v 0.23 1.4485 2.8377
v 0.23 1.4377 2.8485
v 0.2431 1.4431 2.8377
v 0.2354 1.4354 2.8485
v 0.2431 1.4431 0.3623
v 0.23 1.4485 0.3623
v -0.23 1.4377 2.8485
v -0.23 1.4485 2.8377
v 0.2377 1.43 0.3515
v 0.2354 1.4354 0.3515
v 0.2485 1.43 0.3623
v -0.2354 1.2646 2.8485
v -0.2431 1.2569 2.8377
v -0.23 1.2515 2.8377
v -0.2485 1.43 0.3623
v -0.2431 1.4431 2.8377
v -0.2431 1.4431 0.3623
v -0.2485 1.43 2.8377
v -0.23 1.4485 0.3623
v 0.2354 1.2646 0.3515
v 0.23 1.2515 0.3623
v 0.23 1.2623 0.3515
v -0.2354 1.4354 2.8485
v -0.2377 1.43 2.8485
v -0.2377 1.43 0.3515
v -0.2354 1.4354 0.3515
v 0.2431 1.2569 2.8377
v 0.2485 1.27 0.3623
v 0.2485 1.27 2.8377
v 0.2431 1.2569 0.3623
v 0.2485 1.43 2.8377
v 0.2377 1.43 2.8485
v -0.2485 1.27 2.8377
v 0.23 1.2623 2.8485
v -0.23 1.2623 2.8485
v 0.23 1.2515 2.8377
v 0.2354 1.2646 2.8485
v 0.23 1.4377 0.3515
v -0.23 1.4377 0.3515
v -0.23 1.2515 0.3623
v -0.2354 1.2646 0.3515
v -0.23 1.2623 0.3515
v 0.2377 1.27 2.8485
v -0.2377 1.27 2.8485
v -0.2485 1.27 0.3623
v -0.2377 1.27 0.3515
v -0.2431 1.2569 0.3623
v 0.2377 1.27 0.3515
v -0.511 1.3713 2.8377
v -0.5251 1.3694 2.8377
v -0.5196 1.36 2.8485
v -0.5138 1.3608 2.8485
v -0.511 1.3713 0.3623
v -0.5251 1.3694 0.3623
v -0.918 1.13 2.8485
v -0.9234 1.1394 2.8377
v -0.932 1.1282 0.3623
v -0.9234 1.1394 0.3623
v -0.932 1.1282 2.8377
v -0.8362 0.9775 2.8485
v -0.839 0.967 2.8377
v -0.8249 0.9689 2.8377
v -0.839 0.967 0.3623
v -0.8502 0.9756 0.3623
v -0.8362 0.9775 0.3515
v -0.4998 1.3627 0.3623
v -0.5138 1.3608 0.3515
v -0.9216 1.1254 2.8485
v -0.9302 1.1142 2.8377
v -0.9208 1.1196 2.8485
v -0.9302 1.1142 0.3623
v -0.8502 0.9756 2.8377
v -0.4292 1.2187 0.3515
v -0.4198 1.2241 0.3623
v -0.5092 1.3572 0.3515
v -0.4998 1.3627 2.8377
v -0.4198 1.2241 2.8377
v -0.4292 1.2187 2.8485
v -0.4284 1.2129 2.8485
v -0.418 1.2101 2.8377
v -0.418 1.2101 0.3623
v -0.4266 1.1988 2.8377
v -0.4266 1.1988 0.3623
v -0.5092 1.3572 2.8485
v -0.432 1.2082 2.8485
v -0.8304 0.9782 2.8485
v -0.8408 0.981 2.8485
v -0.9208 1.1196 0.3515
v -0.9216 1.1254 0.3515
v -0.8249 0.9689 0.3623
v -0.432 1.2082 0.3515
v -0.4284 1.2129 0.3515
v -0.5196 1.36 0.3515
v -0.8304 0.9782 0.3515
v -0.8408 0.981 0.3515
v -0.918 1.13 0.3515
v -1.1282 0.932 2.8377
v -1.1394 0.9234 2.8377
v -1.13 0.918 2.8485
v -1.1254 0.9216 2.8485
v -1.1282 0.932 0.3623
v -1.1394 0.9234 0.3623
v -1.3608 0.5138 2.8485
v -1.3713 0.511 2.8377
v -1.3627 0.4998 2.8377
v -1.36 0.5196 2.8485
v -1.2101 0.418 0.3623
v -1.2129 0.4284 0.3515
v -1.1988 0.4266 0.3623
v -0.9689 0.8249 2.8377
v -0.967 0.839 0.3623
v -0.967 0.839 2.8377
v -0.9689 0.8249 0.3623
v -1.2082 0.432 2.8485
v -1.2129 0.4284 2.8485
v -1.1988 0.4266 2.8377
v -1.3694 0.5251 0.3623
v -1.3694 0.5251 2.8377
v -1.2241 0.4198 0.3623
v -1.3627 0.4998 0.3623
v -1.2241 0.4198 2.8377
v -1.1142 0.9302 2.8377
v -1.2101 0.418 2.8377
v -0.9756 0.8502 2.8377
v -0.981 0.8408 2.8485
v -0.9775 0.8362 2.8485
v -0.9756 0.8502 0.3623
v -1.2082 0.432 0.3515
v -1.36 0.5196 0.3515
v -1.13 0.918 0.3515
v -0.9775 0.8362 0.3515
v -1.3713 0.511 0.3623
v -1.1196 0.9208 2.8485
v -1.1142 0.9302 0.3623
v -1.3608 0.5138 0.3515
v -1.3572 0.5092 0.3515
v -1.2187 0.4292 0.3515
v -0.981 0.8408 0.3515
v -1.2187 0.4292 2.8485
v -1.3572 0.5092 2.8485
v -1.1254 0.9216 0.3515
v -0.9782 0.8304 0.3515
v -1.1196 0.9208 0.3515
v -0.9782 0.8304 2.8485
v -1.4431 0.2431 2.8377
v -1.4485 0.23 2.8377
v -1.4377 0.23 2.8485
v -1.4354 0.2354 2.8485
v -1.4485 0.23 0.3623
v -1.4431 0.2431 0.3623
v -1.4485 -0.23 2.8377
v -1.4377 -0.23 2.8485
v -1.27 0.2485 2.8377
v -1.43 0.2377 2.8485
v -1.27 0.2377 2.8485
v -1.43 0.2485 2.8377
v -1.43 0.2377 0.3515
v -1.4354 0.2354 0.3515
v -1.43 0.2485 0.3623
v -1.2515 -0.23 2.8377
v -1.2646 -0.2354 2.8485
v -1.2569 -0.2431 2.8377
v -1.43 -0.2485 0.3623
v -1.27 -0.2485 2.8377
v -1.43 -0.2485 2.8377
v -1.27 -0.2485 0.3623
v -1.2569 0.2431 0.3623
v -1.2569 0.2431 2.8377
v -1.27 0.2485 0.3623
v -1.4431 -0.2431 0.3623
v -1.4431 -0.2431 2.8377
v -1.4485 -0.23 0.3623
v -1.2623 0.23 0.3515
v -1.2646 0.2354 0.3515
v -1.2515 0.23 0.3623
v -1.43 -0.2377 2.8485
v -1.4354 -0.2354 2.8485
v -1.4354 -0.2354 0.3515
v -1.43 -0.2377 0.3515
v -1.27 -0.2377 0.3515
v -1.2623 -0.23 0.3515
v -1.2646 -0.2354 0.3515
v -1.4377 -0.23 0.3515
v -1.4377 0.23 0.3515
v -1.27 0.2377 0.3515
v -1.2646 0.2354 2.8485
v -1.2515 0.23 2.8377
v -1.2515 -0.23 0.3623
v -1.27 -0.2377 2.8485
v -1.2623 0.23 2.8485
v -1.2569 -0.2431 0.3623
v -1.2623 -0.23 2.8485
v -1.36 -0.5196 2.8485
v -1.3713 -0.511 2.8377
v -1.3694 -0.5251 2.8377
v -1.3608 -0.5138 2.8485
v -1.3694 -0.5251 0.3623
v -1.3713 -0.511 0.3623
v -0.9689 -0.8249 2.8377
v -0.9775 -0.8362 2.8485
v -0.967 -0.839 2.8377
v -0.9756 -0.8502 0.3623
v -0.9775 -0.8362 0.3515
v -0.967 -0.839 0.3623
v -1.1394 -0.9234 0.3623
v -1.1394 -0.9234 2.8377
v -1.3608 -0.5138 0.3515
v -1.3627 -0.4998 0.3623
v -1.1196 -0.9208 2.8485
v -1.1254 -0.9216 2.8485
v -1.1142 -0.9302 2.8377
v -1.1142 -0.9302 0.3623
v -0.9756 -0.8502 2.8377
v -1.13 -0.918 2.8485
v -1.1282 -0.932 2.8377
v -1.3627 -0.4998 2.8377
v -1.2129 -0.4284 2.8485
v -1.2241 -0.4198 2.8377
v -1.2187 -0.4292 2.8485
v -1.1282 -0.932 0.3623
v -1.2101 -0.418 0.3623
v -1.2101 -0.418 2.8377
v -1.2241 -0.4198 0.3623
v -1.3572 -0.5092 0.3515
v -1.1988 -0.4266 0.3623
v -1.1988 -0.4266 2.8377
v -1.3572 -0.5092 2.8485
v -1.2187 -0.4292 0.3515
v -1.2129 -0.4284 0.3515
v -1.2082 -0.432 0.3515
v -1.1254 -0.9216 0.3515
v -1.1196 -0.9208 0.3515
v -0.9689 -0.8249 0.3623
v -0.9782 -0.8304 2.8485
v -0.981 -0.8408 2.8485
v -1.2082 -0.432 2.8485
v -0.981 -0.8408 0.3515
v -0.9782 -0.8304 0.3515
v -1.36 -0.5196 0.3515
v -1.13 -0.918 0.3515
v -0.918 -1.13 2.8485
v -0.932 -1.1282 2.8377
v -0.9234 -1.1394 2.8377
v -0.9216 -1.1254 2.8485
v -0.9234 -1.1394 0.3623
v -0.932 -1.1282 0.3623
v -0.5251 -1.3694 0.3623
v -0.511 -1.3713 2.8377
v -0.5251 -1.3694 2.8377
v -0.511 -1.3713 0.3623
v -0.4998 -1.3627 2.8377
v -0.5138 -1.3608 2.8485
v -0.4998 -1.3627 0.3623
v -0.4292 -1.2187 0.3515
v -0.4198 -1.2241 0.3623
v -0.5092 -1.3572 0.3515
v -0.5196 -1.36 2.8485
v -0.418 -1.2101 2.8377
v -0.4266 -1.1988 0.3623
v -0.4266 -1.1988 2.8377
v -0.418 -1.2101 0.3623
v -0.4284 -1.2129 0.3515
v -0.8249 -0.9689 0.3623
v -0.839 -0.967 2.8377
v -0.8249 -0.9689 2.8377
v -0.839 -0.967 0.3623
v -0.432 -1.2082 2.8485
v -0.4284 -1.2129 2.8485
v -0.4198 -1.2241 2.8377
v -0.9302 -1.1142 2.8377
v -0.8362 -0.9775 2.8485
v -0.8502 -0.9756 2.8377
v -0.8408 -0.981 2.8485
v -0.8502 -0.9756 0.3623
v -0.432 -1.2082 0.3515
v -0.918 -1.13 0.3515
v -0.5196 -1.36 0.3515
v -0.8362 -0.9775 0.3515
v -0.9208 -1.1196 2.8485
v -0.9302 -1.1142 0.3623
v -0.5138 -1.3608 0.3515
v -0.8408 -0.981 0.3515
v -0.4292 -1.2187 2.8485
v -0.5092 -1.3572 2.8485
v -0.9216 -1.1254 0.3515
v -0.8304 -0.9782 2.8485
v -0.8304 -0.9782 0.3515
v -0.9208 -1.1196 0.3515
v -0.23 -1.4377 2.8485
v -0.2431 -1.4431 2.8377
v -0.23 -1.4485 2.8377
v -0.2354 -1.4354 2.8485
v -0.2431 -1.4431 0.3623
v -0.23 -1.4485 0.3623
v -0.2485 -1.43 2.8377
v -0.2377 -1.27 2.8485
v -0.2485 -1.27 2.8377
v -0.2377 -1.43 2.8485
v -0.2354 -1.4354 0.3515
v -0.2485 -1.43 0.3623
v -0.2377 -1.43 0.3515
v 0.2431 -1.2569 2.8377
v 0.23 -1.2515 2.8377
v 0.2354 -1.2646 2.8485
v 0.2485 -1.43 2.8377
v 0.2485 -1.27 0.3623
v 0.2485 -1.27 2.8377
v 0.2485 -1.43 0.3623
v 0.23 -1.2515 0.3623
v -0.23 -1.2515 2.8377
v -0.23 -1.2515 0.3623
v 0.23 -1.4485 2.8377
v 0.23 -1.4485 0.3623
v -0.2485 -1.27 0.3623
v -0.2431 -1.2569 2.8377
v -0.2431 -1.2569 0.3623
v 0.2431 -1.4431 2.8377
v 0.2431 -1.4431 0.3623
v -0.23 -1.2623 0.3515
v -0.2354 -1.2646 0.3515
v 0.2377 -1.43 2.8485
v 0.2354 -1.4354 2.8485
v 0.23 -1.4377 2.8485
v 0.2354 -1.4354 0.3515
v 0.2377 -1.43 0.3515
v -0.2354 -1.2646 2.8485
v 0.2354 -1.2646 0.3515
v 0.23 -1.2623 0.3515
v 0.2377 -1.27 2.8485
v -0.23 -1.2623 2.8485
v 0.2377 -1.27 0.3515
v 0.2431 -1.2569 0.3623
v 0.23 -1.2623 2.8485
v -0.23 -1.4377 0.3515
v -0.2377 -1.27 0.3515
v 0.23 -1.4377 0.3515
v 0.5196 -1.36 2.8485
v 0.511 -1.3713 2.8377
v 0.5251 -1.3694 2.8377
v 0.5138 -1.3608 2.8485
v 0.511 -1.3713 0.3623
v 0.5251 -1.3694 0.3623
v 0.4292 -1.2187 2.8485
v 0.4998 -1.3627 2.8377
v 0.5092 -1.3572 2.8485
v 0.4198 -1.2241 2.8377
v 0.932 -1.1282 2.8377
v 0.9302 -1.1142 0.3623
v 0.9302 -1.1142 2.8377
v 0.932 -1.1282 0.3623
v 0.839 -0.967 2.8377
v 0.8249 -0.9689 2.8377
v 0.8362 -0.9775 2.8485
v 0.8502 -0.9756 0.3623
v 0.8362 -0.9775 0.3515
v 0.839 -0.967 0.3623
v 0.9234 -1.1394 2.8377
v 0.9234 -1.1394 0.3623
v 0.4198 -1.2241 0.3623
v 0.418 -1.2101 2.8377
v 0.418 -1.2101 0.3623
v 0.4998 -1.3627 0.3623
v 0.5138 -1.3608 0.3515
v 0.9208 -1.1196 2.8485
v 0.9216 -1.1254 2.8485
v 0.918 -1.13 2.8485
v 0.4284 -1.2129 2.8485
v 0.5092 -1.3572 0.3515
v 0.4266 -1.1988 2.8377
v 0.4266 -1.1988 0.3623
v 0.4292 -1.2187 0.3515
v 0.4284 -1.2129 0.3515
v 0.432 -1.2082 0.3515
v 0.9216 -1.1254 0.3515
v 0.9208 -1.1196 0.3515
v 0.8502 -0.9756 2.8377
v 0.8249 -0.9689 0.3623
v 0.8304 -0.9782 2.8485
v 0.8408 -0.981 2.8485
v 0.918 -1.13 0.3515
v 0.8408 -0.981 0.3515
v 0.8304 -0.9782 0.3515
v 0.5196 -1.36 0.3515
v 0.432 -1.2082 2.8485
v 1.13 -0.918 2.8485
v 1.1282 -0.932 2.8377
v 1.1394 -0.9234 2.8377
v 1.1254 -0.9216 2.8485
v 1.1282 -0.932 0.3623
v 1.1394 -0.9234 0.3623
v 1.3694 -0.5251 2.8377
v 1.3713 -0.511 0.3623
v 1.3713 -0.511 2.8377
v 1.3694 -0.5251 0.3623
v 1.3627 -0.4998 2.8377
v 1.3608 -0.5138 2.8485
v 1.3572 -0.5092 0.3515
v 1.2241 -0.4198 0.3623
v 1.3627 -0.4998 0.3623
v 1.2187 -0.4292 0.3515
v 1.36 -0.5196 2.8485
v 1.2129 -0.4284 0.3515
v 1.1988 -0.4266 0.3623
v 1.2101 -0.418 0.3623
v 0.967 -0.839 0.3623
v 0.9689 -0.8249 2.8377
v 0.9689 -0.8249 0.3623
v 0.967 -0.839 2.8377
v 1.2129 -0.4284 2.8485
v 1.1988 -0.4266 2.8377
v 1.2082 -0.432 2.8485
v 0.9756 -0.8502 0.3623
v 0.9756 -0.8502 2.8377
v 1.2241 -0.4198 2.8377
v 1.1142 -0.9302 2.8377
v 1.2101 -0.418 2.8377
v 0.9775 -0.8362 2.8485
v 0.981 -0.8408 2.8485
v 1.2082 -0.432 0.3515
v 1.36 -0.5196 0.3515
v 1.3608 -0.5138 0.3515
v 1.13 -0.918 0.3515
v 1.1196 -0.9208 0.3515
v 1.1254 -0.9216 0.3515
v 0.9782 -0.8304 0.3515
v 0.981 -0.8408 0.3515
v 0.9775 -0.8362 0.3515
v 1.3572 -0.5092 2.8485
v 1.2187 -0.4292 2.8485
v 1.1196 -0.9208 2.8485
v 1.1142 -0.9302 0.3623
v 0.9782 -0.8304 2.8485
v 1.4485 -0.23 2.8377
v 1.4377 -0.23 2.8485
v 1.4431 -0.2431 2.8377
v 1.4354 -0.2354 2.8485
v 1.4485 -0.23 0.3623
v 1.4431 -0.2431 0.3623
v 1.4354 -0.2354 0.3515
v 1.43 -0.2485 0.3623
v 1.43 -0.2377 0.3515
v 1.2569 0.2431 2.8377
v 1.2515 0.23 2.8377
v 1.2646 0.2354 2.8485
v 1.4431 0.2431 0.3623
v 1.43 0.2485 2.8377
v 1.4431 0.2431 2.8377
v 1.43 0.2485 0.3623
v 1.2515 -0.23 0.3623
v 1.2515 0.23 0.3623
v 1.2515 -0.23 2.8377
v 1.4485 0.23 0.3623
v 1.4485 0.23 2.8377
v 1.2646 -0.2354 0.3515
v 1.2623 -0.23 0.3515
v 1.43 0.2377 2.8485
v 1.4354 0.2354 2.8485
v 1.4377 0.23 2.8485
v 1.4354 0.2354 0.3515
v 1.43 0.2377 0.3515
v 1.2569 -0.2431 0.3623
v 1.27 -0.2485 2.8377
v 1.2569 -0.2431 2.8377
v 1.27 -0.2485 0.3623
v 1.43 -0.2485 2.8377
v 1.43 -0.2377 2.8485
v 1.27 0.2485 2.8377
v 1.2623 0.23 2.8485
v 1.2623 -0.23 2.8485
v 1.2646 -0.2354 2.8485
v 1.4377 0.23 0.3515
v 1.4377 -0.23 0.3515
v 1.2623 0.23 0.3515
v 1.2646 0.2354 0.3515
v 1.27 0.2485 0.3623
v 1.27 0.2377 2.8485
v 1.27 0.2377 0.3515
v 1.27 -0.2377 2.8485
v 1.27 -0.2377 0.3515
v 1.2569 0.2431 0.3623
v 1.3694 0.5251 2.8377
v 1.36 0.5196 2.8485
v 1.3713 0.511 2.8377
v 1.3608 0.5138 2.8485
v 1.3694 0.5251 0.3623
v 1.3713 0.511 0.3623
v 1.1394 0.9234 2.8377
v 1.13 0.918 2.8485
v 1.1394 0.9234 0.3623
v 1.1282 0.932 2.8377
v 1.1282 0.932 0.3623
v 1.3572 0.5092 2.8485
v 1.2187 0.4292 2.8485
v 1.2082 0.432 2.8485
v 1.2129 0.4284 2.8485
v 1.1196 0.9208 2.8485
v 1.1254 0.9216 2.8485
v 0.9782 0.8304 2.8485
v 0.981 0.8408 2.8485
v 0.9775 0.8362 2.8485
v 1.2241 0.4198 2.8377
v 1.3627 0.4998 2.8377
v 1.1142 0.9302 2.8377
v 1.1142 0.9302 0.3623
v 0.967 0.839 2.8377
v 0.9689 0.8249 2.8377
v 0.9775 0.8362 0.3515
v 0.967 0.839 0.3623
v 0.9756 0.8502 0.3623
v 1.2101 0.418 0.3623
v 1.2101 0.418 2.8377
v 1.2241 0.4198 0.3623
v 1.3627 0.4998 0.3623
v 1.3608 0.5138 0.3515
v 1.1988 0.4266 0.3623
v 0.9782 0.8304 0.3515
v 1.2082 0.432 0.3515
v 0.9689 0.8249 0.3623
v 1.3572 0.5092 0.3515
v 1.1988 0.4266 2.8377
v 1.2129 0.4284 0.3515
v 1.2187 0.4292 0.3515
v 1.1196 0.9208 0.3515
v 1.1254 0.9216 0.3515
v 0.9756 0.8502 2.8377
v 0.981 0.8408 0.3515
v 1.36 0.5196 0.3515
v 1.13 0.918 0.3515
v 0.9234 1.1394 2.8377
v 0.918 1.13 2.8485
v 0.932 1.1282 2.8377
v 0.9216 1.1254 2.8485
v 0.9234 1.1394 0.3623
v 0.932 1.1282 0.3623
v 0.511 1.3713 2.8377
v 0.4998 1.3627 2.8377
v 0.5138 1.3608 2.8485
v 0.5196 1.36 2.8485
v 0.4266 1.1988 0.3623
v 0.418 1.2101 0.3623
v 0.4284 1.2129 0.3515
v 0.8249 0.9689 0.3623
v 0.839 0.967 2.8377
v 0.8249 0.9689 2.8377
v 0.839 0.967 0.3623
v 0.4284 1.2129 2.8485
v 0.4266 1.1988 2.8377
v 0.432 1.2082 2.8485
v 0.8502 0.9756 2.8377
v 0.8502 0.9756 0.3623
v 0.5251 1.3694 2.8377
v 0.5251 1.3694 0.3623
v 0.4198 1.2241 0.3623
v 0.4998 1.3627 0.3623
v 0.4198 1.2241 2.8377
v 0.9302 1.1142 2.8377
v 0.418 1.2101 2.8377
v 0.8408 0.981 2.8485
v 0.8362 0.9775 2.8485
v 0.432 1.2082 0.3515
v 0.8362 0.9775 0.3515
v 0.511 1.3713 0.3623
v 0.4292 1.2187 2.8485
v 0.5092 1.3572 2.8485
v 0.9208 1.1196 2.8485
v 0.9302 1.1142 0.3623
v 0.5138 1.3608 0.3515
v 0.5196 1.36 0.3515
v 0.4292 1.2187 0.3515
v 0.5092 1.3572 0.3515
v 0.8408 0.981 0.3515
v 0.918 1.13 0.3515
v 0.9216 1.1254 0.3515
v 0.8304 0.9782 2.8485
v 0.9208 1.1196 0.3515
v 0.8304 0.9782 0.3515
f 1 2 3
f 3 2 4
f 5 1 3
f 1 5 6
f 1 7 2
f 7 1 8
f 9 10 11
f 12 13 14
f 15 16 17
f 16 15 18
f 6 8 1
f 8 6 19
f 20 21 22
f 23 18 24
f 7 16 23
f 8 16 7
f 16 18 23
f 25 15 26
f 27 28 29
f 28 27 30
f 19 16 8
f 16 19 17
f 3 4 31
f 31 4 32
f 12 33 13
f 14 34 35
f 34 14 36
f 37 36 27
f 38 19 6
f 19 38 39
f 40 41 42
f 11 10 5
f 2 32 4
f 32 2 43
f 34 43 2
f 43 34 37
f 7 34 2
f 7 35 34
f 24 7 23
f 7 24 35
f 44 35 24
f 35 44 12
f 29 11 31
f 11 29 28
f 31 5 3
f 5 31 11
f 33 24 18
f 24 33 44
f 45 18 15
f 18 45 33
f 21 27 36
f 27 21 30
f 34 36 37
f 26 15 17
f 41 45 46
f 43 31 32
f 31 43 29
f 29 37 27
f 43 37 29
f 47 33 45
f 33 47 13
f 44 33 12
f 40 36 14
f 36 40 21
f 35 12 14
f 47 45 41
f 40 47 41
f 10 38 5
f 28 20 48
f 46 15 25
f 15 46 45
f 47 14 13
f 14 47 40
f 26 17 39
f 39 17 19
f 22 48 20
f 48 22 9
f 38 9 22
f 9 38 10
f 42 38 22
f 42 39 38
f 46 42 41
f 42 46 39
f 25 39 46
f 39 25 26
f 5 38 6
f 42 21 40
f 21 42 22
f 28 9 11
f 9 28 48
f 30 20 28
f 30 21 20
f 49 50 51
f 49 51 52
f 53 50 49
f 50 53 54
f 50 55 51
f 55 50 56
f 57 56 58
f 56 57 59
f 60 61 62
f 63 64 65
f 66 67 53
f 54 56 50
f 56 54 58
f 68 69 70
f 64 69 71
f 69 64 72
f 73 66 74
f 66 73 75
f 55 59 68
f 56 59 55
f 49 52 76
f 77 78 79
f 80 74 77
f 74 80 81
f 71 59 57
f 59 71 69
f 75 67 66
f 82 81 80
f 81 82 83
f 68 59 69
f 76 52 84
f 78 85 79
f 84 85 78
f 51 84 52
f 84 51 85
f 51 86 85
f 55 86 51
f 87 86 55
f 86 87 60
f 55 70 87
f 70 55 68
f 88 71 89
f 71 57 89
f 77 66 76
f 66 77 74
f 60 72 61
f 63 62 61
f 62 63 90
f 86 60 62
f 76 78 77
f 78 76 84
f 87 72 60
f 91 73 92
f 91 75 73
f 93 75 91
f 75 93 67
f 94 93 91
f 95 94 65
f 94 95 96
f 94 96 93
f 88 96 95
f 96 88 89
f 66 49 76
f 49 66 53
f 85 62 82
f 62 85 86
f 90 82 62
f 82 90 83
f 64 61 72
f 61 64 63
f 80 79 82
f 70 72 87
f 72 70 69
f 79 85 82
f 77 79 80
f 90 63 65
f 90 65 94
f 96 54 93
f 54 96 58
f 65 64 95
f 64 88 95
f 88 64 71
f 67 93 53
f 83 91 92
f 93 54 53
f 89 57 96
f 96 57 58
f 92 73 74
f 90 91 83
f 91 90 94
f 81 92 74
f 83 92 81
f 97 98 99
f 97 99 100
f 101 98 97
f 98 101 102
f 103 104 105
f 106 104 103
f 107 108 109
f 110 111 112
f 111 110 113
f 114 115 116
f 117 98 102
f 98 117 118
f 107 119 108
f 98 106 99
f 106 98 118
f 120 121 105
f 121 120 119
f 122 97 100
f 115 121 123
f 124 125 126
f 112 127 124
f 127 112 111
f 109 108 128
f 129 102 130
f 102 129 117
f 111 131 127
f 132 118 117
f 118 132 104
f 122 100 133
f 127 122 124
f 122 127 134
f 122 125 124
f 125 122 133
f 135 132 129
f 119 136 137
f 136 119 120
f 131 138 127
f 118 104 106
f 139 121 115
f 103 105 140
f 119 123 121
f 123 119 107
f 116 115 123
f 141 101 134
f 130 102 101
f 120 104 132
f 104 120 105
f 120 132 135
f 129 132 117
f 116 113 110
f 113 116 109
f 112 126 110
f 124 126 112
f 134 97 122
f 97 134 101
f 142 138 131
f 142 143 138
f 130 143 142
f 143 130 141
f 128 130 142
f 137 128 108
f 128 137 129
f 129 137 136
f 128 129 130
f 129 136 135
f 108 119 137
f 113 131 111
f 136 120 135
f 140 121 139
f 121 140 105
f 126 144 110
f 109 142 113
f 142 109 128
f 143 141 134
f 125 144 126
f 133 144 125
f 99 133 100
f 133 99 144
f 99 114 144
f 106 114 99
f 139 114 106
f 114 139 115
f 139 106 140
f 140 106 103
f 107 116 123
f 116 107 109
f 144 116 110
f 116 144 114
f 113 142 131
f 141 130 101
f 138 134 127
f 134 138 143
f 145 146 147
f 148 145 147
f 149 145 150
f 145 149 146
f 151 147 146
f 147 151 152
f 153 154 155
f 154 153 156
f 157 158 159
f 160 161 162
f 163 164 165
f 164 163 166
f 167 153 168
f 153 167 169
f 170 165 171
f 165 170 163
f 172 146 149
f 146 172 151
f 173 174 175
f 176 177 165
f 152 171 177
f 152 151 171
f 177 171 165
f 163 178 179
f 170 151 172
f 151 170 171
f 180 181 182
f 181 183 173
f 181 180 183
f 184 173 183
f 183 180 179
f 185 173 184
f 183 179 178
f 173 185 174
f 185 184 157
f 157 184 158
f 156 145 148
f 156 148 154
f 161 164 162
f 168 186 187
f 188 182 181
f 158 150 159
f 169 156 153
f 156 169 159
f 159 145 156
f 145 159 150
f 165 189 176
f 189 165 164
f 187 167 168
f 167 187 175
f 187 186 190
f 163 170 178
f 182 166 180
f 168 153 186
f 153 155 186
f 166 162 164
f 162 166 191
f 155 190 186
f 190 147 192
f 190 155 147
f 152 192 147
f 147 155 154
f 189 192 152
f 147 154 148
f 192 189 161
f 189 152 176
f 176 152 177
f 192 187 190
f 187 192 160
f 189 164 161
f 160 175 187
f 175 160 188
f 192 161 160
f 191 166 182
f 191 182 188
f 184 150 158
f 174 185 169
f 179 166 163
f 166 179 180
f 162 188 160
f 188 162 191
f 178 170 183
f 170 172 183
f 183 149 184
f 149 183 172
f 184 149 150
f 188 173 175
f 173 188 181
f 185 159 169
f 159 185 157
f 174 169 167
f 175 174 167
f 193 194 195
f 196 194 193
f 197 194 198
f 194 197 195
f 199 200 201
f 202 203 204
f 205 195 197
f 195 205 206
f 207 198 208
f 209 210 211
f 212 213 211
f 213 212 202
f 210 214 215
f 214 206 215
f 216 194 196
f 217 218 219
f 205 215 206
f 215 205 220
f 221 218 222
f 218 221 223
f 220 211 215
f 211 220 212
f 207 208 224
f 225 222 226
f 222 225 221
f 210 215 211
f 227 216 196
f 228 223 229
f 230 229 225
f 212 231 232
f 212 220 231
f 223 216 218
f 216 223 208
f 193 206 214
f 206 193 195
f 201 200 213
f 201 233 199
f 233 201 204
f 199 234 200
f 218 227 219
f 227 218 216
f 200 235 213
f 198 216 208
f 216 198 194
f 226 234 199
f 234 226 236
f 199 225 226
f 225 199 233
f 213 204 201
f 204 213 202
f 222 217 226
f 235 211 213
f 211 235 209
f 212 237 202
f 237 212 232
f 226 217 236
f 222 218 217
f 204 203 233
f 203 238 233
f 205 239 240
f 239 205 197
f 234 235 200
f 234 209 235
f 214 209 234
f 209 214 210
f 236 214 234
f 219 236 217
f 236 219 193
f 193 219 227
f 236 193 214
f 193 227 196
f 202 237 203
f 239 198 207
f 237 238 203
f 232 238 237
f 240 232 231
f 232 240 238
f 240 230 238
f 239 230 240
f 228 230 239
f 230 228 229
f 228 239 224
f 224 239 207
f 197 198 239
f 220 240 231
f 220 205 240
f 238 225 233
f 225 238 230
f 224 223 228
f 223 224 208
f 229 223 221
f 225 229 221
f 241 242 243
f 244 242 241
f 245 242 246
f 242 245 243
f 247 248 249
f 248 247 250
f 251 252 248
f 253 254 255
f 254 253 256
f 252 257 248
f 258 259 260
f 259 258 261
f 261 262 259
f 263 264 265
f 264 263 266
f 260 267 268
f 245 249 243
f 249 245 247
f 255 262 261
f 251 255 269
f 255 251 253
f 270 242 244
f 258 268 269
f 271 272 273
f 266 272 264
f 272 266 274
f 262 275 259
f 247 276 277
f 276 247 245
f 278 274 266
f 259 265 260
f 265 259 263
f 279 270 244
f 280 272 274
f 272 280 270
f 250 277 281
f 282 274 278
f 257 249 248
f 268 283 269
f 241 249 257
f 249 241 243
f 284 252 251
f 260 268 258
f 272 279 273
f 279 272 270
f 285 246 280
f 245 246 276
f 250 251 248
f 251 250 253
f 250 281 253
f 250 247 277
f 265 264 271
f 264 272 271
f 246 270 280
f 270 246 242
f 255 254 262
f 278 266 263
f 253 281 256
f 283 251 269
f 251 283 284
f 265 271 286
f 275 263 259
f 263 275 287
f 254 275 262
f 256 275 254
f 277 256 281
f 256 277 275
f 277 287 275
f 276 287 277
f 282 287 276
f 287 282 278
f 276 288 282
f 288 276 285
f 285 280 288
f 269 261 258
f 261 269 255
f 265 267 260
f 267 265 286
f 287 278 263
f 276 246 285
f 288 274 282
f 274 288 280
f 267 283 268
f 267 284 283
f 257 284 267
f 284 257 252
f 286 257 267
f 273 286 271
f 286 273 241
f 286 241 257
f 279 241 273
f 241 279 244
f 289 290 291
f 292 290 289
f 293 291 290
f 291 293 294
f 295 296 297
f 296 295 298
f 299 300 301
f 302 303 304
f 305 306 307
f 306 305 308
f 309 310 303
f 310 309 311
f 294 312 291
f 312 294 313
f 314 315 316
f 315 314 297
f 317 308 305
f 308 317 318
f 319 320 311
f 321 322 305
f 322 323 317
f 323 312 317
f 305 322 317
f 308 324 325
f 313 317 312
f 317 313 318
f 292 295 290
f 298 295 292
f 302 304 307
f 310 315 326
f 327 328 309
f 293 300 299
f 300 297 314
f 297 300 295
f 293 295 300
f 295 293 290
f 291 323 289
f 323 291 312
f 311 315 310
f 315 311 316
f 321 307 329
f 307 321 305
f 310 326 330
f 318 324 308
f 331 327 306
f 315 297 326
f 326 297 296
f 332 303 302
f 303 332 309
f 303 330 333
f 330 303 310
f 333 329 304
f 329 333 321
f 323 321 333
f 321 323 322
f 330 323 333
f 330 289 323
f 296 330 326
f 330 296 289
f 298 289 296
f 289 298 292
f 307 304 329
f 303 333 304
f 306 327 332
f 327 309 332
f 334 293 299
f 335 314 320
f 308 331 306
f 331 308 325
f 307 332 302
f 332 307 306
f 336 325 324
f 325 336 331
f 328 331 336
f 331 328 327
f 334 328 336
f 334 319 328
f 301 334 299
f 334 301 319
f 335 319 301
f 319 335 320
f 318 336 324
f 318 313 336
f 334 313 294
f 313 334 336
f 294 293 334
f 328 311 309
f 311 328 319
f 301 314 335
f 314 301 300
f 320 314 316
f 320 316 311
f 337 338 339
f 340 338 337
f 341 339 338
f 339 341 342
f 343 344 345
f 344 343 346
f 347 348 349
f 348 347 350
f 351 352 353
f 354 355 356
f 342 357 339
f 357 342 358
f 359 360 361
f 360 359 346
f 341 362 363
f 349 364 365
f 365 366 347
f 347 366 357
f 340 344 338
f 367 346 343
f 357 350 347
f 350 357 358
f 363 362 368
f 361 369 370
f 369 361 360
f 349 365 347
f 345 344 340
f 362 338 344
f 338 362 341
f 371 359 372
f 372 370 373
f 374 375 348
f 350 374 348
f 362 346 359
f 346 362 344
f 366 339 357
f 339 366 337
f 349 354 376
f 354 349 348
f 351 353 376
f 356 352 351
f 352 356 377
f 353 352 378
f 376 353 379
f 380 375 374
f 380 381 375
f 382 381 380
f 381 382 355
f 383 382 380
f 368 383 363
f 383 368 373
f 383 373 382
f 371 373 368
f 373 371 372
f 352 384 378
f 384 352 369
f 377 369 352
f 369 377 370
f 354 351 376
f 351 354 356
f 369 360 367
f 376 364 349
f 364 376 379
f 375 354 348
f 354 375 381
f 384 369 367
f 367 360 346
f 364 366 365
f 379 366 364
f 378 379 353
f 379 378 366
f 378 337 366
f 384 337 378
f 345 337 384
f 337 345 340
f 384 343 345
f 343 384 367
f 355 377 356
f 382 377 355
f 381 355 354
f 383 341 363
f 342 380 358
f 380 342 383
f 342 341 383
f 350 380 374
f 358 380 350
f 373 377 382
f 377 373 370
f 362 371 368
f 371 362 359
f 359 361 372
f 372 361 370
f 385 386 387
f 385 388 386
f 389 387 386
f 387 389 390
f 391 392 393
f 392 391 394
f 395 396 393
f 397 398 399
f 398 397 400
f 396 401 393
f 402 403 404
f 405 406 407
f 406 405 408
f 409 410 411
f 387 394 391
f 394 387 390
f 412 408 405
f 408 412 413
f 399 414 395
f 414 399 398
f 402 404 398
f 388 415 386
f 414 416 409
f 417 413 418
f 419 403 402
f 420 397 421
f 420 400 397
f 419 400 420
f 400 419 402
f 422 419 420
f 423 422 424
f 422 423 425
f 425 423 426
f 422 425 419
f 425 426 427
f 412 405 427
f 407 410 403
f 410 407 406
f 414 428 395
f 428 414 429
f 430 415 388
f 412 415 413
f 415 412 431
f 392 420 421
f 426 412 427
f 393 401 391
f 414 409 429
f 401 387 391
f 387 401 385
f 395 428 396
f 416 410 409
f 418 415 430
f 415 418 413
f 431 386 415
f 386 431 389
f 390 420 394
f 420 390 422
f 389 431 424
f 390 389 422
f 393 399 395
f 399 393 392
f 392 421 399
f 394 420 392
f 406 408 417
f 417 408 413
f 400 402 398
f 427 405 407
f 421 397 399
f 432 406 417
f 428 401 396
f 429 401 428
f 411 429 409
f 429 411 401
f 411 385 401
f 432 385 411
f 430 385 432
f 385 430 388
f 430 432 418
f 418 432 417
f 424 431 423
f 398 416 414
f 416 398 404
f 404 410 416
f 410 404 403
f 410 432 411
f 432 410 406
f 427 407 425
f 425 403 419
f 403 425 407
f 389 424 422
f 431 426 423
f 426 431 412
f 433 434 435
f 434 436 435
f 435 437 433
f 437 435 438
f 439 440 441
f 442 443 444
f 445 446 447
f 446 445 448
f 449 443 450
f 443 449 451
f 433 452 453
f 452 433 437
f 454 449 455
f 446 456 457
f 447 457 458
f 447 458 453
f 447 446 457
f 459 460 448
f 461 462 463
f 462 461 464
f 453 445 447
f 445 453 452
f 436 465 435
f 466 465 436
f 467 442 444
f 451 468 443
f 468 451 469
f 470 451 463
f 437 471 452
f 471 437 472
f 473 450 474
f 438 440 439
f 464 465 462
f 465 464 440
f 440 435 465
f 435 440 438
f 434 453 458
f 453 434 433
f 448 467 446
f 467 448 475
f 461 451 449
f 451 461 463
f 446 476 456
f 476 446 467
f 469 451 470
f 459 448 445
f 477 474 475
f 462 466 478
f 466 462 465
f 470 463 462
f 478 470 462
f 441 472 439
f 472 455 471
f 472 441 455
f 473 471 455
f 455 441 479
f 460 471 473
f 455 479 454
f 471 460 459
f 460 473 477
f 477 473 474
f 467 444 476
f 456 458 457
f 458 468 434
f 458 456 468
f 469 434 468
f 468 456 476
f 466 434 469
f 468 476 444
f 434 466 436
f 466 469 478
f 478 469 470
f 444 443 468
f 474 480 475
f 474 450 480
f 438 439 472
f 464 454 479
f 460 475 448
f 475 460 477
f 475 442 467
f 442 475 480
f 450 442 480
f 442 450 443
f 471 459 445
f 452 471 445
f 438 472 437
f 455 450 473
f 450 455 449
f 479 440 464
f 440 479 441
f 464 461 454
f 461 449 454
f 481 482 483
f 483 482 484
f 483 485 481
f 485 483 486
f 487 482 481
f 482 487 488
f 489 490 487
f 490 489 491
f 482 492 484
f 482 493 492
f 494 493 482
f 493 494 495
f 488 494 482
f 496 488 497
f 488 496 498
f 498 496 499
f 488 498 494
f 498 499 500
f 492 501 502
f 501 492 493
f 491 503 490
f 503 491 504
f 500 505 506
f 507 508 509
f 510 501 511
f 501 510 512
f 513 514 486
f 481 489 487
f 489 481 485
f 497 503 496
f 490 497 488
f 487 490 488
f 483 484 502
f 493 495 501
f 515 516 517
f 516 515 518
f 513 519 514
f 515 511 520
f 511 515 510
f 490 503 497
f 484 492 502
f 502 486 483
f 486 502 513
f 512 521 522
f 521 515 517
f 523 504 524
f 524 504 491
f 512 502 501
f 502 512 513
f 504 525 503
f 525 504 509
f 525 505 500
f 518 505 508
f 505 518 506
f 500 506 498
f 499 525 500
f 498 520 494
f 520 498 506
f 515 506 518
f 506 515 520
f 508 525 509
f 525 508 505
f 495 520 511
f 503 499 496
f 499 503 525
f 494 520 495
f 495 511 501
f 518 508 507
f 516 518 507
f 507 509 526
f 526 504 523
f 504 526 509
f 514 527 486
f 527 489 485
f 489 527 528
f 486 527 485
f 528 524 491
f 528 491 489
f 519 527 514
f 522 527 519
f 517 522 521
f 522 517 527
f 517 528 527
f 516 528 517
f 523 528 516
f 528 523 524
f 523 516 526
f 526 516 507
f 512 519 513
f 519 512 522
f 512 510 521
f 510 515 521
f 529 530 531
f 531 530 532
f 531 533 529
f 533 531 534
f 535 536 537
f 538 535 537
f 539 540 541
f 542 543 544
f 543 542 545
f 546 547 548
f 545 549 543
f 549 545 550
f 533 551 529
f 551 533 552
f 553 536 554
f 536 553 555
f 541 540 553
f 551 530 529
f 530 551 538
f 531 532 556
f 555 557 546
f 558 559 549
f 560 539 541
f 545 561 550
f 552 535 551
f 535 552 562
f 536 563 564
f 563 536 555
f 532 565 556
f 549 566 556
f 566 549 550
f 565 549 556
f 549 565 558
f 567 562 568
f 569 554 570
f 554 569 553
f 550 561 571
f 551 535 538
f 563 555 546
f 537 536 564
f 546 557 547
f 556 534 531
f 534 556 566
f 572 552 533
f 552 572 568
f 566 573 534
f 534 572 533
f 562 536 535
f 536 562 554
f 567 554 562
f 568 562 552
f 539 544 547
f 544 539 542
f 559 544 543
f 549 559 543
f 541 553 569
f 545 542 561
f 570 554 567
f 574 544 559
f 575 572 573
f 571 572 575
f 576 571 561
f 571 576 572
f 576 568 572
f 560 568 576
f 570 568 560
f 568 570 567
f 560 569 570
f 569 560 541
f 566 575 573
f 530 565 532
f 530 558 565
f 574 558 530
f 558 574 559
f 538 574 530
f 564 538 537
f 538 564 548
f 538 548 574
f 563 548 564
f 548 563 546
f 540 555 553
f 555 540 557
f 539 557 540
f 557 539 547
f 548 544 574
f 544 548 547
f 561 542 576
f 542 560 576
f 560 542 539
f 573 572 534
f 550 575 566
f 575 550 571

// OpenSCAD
use <lib.scad>

hd = 72;
ld = 12;

module slatsHD() {
	for (i = [0:30:360]) rotate([0,0,i]) translate([0,1.35,1.6]) rbox([0.5,0.2,2.5],0.02,$fn=8);
}

module slatsLD() {
	for (i = [0:30:360]) rotate([0,0,i]) translate([0,1.35,1.6]) box([0.5,0.2,2.5]);
}

module baseHD($fn=hd) {
	translate([0,0,1.5]) difference() {
		union() {
			cyl(1.4, 1.4, 3.0);
			translate([0,0,0.6]) cyl(0.6, 0.6, 2.0,$fn=hd/2);
			translate([0,0,-1.45]) hull($fn=8) {
				translate([0,0,0.15]) cyl(1.4, 1.4, 0.1);
				box([2.975,2.975,0.1]);
			}
		}
		translate([0,0,1]) cyl(0.5,0.5,2.0,$fn=$fn/2);
	}
}

module baseLD($fn=ld) {
	translate([0,0,1.5]) difference() {
		union() {
			cyl(1.4, 1.4, 3.0);
			translate([0,0,0.6]) cyl(0.6, 0.6, 2.0);
			translate([0,0,-1.45]) hull($fn=8) {
				translate([0,0,0.15]) cyl(1.4, 1.4, 0.1);
				box([2.975,2.975,0.1]);
			}
		}
		translate([0,0,1]) cyl(0.5,0.5,2.0);
	}
}

module baseVLD($fn=ld) {
	translate([0,0,1.5]) difference() {
		union() {
			cyl(1.4, 1.4, 3.0);
			translate([0,0,-1.45]) box([2.975,2.975,0.3]);
		}
		translate([0,0,1]) cyl(0.5,0.5,2.0,$fn=$fn/2);
	}
}

slatsHD();
//baseLD();
